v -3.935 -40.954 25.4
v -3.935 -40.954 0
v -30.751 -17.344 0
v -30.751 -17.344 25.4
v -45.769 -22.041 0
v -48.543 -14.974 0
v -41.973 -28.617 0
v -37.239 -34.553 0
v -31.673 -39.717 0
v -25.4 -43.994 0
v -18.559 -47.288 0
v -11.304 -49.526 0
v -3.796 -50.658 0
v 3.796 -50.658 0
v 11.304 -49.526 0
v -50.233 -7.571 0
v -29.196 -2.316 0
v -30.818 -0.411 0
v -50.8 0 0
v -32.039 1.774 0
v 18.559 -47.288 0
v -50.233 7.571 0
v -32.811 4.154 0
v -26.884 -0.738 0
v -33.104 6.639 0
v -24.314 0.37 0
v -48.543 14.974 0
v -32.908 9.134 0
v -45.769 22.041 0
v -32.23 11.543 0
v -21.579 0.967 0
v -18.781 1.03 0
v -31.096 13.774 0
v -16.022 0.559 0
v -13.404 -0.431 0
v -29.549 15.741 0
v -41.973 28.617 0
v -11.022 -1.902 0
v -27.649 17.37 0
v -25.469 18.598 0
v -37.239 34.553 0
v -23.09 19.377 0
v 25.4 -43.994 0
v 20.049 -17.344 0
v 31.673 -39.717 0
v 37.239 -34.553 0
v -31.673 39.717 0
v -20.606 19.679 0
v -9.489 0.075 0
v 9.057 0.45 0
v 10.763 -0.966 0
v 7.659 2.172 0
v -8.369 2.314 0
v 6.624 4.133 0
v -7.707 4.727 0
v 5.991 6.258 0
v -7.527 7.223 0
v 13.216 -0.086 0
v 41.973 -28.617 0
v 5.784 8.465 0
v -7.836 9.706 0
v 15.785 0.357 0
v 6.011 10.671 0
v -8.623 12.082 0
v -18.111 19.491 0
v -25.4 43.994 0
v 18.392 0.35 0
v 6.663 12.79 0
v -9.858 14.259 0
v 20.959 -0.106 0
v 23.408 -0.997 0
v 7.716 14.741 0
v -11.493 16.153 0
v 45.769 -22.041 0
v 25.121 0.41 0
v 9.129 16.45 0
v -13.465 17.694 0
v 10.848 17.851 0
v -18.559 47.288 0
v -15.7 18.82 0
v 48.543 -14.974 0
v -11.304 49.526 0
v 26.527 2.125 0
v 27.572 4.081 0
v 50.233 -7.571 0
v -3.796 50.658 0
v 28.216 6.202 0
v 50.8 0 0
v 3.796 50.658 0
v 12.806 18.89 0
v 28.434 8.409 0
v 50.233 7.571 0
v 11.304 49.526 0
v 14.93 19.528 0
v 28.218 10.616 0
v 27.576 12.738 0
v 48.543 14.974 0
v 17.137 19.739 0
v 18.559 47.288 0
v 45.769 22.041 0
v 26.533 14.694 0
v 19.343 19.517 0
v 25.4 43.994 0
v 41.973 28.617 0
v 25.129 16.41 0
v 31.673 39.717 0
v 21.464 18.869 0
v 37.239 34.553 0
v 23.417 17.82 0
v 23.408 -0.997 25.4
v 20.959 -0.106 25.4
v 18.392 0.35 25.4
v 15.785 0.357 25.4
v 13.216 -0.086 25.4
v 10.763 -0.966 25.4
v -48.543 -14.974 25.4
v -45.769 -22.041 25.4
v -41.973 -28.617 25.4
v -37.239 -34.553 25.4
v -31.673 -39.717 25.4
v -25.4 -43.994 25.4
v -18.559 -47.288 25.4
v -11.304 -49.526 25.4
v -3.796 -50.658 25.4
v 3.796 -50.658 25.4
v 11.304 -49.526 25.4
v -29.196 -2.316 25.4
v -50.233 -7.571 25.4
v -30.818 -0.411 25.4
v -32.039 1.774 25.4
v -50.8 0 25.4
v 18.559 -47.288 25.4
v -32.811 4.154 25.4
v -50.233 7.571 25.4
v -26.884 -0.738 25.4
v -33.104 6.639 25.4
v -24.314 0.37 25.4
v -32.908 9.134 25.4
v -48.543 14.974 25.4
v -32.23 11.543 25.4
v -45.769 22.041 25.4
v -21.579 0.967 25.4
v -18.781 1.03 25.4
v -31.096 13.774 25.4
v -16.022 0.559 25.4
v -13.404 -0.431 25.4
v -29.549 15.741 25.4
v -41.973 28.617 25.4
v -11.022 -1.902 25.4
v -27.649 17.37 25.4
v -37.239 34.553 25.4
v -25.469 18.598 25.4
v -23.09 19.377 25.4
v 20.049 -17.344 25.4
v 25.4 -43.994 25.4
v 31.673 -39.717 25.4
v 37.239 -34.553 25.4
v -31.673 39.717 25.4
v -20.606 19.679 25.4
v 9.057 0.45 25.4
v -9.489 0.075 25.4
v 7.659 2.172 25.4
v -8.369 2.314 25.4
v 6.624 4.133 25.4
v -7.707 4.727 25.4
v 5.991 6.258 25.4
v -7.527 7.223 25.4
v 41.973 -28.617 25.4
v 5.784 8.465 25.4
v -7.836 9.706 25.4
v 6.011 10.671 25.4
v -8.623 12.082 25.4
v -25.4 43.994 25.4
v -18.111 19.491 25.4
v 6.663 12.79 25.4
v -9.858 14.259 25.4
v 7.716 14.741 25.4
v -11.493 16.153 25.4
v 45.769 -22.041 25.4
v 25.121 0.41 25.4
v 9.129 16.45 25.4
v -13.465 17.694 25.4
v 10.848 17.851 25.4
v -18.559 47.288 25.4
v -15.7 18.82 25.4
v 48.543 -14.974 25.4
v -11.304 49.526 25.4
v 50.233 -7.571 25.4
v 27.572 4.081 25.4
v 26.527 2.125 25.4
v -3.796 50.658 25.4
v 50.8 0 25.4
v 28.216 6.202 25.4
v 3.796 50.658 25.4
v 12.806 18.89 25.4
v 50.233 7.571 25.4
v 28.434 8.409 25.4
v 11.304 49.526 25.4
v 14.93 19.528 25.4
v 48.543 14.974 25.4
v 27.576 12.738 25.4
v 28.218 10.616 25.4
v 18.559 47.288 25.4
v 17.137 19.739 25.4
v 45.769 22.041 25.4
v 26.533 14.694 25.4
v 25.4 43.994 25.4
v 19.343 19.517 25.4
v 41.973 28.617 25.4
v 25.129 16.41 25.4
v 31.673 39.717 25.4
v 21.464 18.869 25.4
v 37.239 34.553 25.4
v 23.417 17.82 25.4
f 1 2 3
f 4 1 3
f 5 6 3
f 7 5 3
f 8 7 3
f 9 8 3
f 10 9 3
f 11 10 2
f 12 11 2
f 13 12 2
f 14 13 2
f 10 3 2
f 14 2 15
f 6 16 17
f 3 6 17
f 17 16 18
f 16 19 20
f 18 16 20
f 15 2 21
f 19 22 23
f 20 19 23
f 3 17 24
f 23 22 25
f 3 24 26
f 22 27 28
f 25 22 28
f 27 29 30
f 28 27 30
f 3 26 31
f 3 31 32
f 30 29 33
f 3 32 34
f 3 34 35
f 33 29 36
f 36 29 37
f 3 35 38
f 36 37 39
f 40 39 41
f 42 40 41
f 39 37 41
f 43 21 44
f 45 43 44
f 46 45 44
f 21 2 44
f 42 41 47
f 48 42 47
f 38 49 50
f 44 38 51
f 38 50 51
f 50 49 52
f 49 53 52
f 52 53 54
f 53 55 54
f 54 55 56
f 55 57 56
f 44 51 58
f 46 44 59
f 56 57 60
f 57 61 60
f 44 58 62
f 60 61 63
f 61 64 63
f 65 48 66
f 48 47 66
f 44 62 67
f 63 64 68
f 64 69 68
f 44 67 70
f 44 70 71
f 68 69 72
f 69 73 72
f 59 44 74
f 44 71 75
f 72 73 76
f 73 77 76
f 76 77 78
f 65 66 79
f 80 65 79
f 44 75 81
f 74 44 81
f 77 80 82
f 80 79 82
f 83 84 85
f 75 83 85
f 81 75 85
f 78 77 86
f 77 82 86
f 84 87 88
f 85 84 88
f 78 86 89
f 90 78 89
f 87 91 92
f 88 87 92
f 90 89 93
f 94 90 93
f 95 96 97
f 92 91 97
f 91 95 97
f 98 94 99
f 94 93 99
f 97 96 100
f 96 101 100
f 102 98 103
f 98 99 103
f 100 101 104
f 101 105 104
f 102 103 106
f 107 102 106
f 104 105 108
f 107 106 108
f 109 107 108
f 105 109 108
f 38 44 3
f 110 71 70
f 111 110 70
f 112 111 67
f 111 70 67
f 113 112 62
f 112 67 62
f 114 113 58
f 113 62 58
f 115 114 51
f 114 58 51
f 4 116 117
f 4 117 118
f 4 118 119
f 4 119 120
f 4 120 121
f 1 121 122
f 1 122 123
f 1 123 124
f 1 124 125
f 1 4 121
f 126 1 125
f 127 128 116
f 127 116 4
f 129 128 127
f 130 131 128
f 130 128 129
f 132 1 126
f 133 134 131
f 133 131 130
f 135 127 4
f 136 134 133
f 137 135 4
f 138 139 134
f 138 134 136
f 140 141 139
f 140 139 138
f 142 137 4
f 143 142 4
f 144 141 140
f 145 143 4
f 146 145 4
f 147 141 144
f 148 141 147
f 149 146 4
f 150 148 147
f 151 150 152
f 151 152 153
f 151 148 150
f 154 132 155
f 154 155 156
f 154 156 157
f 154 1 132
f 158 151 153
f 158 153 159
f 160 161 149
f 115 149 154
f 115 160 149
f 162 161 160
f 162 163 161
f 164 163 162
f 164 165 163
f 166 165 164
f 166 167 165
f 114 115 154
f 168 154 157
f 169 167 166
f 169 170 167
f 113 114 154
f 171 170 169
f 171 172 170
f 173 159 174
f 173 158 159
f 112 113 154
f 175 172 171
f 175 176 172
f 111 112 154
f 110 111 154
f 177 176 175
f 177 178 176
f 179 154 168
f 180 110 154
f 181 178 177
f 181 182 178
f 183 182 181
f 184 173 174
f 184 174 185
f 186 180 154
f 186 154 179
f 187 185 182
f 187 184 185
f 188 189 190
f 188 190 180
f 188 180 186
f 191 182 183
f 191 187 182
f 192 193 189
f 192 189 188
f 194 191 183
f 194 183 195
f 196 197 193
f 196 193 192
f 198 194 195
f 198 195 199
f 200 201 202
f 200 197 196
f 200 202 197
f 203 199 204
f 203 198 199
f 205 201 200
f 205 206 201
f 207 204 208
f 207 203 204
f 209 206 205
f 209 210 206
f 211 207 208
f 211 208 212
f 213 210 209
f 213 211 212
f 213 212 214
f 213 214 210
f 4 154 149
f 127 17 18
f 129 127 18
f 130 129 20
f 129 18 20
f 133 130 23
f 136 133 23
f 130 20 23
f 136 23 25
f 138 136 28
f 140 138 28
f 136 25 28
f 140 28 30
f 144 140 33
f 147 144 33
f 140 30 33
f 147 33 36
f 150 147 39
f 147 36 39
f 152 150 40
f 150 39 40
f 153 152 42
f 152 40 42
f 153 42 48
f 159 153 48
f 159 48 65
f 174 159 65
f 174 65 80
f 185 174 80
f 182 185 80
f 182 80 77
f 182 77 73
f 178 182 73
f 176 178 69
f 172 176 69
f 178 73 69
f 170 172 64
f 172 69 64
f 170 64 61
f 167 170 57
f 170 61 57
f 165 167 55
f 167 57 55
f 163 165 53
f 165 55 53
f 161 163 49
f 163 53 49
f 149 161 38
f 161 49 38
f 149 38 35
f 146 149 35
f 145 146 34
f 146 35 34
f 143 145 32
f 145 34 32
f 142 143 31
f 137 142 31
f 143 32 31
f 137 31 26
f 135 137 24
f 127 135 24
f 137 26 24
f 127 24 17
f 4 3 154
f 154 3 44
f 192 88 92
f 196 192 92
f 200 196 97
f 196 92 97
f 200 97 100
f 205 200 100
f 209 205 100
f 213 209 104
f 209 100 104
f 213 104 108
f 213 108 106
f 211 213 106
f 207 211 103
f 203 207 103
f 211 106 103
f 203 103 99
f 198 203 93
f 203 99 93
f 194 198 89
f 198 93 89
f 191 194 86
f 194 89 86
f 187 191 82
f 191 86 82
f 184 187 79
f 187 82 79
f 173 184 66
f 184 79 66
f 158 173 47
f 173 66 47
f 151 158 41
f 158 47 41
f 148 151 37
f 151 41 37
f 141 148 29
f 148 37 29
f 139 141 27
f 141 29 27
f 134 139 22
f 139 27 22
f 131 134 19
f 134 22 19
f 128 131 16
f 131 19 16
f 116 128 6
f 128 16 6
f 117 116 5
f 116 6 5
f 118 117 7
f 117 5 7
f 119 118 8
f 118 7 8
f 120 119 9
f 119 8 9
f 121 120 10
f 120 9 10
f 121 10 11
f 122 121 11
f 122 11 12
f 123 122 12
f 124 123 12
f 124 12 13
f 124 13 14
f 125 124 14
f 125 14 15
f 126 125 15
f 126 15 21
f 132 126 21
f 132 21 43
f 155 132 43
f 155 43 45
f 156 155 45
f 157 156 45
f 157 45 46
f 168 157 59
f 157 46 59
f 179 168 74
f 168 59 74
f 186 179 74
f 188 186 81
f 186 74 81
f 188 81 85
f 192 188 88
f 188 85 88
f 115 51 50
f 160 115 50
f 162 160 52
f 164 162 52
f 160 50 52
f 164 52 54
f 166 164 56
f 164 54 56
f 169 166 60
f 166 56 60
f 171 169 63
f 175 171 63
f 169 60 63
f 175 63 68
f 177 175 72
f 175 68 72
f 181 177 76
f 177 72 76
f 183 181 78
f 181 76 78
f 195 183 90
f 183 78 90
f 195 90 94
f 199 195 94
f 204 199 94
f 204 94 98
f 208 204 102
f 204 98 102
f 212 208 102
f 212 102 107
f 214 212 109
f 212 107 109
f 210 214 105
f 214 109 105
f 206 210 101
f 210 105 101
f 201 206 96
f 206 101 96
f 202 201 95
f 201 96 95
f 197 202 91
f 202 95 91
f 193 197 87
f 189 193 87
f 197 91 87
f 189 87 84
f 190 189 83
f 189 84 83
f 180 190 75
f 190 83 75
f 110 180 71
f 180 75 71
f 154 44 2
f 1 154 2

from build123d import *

# Parameters (mm, degrees)
F0_R     = 50.8
F1_DEPTH = 25.4


with BuildPart() as f1:
    # F0 (on Top) → F1 (new body)
    with BuildSketch(Plane.XY):
        Circle(F0_R)
        Polygon((-3.934918, -40.953953), (-30.750657, -17.344443), (20.049343, -17.344443), align=None, mode=Mode.SUBTRACT)
        with BuildLine():
            ThreePointArc((-29.195861, -2.316432), (-20.606169, 19.678536), (-11.022453, -1.901868))
            ThreePointArc((-11.022453, -1.901868), (-20.181581, 1.065741), (-29.195861, -2.316432))
        make_face(mode=Mode.SUBTRACT)
        with BuildLine():
            ThreePointArc((10.762538, -0.96585), (17.137034, 19.739171), (23.408223, -0.997373))
            ThreePointArc((23.408223, -0.997373), (17.08885, 0.410144), (10.762538, -0.96585))
        make_face(mode=Mode.SUBTRACT)
    extrude(amount=F1_DEPTH)


solid = f1.part
